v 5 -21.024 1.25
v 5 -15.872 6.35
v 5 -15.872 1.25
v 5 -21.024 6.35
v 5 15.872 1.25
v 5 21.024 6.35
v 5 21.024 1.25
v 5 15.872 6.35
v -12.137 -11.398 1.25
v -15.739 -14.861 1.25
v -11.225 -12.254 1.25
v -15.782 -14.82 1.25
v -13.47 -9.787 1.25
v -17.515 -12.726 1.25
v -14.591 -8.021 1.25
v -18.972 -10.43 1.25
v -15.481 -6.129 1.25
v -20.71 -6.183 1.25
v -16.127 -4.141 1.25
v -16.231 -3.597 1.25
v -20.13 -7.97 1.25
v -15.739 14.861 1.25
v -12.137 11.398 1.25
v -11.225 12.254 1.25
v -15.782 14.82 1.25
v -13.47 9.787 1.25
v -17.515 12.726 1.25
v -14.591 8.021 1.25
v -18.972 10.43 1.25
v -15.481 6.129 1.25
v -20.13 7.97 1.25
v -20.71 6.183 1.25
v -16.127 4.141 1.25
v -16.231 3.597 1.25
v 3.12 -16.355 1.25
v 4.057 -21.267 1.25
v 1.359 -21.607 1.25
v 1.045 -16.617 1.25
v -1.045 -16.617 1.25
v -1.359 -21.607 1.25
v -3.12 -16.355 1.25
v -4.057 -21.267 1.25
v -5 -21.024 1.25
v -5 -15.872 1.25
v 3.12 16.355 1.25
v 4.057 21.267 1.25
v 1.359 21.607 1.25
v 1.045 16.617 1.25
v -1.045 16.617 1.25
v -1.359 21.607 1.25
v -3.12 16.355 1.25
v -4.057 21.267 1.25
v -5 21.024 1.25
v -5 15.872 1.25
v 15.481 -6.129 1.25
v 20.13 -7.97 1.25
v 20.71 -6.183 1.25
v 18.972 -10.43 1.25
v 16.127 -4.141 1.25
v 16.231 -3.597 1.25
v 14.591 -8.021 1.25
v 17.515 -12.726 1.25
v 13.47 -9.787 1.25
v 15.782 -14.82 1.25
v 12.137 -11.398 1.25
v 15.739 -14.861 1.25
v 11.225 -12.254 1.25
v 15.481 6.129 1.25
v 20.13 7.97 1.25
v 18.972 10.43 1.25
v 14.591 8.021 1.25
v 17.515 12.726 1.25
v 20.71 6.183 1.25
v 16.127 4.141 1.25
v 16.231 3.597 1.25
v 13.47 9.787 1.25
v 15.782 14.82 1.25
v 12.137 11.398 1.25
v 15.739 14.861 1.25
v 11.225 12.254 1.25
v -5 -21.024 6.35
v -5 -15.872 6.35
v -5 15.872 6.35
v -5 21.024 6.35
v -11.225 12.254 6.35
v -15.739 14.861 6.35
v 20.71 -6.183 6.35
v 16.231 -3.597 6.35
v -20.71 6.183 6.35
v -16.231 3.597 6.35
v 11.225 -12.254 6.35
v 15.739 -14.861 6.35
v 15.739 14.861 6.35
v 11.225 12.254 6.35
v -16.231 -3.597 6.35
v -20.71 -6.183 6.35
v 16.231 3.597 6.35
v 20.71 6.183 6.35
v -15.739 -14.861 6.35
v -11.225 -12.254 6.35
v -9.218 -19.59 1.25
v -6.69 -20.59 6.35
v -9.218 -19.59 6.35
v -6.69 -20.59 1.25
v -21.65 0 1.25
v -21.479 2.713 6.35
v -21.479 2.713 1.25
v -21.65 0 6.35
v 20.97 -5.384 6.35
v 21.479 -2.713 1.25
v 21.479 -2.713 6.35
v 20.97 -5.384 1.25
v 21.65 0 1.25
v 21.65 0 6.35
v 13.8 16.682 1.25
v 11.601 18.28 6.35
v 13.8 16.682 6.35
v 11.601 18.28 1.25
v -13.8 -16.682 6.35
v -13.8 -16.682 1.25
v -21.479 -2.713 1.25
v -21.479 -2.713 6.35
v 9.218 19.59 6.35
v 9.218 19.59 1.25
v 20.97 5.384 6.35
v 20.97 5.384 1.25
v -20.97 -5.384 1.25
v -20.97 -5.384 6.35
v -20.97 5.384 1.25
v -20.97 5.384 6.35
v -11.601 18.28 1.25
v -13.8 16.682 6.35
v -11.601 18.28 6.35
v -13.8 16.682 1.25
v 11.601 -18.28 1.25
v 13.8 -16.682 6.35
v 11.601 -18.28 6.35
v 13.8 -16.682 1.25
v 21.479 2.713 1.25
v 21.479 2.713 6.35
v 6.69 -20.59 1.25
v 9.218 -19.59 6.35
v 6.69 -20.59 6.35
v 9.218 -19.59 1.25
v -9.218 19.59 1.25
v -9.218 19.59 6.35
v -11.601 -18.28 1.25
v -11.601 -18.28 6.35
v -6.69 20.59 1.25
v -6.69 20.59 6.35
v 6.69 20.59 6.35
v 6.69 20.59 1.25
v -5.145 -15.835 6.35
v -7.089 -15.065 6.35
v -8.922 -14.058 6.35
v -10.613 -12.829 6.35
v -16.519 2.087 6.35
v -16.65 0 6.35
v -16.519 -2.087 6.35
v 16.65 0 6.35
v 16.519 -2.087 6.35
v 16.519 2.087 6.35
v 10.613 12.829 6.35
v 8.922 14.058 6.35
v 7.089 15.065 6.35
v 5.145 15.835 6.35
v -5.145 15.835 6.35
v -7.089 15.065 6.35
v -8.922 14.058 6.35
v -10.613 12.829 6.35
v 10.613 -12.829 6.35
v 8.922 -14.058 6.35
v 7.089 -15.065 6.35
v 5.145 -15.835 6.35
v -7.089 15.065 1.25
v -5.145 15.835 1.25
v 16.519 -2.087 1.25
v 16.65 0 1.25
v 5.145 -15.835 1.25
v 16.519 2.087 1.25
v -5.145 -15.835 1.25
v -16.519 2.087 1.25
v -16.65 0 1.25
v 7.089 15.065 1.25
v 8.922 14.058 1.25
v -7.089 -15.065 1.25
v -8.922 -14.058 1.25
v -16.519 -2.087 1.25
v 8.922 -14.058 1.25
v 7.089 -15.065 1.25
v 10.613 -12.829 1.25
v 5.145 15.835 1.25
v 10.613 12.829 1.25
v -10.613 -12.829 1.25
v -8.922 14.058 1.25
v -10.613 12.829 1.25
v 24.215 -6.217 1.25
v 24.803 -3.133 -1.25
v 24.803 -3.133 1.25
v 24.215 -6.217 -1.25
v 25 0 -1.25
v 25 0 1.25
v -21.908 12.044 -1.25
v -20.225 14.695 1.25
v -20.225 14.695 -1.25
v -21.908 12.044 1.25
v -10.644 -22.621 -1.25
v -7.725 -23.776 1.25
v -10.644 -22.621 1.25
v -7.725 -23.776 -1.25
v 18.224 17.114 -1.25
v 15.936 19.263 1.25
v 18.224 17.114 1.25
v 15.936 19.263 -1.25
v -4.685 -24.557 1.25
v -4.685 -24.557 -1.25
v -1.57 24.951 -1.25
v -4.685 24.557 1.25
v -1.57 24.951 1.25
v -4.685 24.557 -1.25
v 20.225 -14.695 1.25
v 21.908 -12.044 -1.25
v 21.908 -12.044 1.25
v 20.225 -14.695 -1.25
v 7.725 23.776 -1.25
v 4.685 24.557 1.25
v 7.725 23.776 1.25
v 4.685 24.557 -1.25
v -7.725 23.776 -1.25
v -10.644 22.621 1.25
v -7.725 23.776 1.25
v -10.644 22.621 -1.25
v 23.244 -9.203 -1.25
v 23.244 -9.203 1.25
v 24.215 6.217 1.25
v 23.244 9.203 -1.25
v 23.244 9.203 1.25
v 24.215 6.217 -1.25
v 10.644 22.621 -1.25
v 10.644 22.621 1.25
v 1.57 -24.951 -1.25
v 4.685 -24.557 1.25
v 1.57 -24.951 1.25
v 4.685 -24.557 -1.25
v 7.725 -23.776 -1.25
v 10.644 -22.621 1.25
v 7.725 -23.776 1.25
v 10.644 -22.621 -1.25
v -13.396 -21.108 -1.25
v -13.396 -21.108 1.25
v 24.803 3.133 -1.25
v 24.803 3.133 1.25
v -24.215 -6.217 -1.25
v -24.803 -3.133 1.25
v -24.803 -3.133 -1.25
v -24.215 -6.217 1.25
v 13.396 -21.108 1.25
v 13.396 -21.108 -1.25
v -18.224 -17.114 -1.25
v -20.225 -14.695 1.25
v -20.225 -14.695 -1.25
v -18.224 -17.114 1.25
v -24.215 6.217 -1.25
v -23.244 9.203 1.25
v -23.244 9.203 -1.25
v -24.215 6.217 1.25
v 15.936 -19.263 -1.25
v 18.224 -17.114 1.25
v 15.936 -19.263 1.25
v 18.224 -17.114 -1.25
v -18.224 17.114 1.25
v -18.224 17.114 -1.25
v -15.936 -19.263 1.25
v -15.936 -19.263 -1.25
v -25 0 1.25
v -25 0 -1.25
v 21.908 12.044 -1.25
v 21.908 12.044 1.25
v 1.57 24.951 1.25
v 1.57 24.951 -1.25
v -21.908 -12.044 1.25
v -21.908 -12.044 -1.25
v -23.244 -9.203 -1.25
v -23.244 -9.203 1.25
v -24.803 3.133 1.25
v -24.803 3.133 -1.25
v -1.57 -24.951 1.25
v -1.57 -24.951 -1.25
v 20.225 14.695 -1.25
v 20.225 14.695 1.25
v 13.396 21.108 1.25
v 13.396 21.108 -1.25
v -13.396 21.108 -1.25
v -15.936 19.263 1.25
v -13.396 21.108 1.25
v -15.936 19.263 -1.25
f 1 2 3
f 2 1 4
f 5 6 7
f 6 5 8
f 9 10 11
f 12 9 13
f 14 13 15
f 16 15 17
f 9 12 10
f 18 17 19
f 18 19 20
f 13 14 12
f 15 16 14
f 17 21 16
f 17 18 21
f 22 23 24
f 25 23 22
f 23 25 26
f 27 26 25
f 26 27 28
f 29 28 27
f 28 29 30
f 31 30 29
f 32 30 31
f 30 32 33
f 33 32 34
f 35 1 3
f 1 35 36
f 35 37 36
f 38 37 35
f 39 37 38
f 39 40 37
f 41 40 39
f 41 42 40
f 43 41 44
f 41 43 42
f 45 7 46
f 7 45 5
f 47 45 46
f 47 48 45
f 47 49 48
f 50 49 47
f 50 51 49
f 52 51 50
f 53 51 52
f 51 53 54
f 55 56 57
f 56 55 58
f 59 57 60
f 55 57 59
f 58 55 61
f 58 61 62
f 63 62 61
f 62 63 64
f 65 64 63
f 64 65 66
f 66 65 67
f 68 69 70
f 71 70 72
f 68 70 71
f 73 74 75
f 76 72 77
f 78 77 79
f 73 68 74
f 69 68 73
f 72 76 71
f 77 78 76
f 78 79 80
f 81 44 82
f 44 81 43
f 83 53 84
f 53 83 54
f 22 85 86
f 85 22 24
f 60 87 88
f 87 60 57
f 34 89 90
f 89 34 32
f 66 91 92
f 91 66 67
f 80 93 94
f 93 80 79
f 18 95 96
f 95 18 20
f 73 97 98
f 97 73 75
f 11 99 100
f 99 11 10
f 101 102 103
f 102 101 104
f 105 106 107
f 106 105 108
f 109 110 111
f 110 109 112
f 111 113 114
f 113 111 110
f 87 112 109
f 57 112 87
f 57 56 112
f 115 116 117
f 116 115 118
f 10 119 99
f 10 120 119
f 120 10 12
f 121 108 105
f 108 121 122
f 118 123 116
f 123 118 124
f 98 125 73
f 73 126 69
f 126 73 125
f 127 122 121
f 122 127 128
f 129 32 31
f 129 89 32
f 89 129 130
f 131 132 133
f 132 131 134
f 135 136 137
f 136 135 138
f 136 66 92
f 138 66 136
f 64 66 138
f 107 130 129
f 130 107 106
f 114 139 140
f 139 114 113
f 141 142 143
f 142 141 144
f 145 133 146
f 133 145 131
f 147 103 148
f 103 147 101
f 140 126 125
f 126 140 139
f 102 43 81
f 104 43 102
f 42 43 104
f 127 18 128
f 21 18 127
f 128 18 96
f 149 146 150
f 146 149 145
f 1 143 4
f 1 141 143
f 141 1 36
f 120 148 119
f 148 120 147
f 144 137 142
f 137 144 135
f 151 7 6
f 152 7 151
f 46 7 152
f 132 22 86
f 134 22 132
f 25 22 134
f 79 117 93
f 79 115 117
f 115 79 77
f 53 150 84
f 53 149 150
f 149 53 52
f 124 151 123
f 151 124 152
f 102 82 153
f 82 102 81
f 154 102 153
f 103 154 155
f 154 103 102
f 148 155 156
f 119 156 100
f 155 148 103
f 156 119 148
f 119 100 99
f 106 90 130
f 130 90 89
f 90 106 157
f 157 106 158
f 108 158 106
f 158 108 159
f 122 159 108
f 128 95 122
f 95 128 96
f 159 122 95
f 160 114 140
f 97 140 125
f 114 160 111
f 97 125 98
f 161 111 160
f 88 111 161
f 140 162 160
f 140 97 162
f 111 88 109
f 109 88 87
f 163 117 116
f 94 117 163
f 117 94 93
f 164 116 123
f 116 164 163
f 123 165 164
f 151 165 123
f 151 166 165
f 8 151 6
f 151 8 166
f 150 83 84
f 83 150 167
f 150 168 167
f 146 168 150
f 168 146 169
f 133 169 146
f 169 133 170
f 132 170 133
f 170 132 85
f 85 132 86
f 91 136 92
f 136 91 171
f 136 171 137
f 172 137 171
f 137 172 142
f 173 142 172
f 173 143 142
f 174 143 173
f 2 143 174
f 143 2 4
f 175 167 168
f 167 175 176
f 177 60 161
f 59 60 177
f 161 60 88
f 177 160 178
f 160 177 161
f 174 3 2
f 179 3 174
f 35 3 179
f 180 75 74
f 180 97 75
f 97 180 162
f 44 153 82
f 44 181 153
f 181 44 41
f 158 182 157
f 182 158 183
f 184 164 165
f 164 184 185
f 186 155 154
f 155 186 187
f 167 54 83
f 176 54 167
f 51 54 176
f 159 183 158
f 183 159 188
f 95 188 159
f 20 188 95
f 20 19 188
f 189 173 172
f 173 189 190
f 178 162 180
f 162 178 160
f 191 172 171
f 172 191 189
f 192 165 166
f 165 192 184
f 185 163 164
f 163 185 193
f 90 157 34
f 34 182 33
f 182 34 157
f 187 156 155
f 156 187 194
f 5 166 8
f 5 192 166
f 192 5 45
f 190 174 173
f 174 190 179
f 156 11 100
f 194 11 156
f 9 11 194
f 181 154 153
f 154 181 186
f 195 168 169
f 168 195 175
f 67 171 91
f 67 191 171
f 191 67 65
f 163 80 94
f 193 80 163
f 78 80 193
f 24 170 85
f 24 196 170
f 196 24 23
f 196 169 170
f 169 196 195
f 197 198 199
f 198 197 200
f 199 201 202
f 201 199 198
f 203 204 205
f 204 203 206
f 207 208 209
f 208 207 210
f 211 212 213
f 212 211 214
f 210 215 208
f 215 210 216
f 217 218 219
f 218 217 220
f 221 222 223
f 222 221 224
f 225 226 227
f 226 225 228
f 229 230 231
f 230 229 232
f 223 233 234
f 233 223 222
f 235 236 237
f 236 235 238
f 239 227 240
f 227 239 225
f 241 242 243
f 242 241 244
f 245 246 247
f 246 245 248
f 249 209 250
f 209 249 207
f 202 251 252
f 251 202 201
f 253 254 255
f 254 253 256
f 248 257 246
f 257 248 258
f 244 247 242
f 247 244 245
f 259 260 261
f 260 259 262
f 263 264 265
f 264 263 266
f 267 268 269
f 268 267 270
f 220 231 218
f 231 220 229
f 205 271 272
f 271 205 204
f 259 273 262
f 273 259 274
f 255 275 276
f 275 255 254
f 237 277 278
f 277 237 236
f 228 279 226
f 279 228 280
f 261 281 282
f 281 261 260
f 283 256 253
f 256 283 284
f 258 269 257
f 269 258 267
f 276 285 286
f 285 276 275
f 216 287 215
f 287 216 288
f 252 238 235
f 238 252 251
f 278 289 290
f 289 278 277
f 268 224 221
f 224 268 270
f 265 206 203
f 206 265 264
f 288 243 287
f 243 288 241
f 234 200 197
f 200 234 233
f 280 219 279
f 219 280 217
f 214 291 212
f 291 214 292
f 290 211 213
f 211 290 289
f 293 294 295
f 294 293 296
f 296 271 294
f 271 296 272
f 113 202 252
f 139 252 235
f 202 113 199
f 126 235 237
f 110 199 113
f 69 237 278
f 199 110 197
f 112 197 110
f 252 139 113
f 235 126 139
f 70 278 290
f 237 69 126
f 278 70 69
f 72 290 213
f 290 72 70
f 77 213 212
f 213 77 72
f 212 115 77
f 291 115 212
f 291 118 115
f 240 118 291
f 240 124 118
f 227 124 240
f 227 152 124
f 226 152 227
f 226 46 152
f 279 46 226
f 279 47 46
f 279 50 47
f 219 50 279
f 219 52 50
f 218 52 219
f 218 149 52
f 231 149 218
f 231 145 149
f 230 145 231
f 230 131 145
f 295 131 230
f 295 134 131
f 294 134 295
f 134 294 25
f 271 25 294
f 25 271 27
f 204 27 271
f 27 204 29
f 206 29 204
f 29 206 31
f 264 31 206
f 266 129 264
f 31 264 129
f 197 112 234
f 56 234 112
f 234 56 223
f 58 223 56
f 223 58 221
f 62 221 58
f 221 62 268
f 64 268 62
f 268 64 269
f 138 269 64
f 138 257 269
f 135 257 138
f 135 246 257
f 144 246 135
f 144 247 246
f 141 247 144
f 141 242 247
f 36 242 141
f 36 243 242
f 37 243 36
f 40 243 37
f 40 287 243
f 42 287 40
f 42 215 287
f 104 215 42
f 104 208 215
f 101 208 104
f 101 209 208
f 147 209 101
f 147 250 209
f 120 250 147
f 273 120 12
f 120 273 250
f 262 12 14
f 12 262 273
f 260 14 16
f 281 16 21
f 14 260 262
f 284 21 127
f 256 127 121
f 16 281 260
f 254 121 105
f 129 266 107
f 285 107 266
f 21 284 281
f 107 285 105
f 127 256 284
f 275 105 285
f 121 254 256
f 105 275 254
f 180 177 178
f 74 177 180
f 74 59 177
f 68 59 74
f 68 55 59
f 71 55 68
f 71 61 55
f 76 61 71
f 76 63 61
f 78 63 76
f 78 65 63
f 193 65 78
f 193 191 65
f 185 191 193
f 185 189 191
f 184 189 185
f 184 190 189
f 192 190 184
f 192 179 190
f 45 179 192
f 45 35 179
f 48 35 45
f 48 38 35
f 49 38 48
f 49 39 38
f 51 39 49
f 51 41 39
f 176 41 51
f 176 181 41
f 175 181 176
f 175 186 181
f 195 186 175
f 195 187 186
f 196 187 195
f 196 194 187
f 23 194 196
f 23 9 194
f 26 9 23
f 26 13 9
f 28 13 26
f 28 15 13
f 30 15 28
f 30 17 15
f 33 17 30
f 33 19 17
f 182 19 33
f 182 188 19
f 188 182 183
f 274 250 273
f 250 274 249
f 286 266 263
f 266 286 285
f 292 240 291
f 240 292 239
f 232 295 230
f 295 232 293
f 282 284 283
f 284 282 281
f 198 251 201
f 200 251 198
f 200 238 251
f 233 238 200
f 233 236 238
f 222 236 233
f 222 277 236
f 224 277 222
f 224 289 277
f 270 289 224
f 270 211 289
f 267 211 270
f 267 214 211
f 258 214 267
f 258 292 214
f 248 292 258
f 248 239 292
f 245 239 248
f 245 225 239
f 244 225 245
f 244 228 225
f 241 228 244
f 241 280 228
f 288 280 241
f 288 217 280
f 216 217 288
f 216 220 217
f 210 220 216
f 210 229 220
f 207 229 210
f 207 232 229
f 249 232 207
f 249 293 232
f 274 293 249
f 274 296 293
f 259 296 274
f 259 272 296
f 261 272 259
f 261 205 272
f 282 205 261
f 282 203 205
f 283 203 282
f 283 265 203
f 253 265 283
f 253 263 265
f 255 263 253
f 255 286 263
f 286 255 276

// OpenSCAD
$fn = 50;

top_d = 50;
top_h = 2.5;
border_d = 43.3;
border_w = 5;
border_h = 5.6;
cut_count = 3;
cut_w = 10;

rotate([180, 0, 0]) {
  cylinder(d=top_d, h=top_h, center=true);
  translate([0, 0, -(border_h+top_h)/2+1]) {
    difference() {
      cylinder(d=border_d, h=border_h+1, center=true);
      cylinder(d=border_d-border_w*2, h=border_h+1, center=true);
      translate([0, 0, -1]) {
        for(i=[0:cut_count]) {
          rotate([0, 0, 360/cut_count*i]) {
            cube([cut_w, top_d, border_h], center=true);
          }
        }
      }
    }
  }
}
